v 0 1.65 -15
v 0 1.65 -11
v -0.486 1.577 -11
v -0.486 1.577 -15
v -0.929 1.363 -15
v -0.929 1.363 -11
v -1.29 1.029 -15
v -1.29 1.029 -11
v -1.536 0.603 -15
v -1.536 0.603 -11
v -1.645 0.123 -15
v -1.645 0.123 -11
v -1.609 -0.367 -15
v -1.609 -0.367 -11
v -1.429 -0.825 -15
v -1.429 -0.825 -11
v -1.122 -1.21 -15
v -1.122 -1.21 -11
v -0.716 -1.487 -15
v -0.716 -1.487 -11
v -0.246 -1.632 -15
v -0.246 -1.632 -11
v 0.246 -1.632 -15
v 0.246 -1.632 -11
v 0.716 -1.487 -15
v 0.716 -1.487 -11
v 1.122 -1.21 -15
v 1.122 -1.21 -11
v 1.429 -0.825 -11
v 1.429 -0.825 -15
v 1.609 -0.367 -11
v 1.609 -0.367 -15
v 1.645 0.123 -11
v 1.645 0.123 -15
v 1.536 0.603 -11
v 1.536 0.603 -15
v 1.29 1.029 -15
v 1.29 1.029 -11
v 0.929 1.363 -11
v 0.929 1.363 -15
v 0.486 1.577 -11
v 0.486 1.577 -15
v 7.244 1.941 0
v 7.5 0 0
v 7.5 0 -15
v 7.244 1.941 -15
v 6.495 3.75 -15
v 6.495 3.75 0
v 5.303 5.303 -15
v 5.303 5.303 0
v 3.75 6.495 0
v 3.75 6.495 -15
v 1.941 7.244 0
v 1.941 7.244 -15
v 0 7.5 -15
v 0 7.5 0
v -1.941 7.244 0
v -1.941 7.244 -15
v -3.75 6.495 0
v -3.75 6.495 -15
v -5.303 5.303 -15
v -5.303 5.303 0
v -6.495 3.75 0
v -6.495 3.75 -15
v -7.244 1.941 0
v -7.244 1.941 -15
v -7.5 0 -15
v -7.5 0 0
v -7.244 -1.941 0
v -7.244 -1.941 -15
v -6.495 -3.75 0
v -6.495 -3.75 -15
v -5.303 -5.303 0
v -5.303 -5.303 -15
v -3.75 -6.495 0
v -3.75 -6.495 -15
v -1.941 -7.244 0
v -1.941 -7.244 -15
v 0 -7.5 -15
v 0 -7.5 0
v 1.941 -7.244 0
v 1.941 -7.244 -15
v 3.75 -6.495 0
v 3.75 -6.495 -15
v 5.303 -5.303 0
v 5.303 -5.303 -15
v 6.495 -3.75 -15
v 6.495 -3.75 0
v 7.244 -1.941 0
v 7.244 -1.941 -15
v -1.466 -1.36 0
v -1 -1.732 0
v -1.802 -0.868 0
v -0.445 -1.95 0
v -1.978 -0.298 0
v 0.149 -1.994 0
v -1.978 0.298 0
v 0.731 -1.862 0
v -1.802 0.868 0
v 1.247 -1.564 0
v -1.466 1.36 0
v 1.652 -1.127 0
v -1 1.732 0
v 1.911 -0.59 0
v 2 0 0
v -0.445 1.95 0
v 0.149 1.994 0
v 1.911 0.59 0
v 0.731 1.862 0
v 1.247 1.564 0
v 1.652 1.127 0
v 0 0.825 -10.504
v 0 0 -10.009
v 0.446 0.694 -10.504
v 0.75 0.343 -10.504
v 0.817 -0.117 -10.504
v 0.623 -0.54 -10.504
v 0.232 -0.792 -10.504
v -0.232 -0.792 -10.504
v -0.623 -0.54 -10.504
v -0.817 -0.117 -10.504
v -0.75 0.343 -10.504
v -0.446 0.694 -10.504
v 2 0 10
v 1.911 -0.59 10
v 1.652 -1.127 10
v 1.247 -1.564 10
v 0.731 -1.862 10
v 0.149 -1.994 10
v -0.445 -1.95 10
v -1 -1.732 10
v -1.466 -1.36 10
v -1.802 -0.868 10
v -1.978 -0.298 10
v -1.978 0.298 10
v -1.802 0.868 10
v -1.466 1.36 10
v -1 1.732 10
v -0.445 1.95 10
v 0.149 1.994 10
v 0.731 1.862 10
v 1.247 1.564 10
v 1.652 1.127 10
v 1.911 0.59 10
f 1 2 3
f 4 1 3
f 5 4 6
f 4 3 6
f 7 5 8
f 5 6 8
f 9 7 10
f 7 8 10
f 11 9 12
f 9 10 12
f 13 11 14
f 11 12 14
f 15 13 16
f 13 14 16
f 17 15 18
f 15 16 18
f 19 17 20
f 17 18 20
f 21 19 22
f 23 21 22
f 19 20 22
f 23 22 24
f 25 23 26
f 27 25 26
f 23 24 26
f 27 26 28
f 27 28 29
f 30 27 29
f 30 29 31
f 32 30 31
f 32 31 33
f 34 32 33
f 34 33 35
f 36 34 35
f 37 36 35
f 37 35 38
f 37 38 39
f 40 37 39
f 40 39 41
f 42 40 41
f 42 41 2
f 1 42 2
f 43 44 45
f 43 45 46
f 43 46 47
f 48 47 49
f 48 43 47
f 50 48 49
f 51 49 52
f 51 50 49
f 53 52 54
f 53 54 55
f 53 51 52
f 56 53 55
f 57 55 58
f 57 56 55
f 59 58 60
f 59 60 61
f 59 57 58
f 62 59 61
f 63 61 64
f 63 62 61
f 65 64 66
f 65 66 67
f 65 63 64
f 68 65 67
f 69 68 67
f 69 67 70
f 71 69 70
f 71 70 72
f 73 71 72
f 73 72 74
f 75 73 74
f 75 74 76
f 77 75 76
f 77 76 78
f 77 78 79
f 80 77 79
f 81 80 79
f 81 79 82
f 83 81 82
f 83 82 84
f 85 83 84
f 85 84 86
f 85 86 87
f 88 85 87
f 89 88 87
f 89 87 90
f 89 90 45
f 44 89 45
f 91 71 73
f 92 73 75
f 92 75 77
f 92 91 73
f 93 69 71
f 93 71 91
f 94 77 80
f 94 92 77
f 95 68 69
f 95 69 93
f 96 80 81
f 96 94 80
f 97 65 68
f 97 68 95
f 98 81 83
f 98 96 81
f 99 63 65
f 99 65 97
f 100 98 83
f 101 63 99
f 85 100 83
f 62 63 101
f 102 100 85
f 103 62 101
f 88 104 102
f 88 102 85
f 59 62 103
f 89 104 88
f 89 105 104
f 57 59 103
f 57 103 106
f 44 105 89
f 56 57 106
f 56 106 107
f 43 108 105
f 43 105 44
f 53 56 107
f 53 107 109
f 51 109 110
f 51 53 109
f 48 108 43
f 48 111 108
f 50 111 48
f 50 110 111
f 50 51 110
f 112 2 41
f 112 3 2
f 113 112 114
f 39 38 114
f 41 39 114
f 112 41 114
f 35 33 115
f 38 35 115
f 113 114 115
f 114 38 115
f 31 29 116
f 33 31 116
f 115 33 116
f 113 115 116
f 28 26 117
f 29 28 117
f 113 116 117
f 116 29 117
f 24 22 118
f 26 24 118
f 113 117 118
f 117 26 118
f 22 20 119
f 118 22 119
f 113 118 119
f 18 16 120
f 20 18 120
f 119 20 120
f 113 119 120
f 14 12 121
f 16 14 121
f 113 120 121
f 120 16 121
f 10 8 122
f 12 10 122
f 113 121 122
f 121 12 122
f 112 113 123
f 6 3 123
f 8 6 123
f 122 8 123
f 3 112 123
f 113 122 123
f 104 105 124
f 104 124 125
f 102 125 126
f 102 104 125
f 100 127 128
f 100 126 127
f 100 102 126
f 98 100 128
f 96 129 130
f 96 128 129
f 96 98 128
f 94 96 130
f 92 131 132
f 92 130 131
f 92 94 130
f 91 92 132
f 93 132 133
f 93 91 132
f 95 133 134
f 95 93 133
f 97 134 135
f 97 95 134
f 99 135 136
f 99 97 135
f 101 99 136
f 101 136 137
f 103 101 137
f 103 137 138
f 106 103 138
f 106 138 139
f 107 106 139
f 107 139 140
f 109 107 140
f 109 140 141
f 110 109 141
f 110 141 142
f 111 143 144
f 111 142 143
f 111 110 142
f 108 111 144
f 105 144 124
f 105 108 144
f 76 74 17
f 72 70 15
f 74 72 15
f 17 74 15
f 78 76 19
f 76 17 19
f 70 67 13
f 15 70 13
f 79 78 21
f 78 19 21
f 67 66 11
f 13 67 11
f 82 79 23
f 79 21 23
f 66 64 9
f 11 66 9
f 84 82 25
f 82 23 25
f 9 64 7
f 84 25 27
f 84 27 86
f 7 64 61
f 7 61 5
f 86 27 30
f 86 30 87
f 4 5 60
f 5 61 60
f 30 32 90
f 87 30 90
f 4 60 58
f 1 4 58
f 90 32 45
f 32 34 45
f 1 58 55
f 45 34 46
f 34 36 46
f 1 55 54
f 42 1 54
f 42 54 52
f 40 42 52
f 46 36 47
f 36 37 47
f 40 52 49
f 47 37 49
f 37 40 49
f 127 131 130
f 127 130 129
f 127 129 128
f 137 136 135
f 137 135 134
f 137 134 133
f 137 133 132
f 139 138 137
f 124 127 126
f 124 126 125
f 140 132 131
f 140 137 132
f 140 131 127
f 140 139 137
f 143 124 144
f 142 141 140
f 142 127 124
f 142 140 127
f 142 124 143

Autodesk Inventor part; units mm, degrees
ref_plane "YZ Plane" through (0, 0, 0) normal (1, 0, 0) x (0, 1, 0)
ref_plane "XZ Plane" through (0, 0, 0) normal (0, 1, 0) x (-1, 0, 0)
ref_plane "XY Plane" through (0, 0, 0) normal (0, 0, 1) x (1, 0, 0)
sketch "スケッチ1" plane through (0, 0, 0) normal (0, 0, 1) x (1, 0, 0)
  circle A0 centre (0, 0) radius 7.5
  circle A1 centre (0, 0) radius 2
  dimension "d0" = 15
  dimension "d1" = 4
extrude "押し出し1" add sketch "スケッチ1" along normal blind 10 contours A1
extrude "押し出し2" add sketch "スケッチ1" against normal blind 15 contours A0 | A1
sketch "スケッチ2" plane through (0, 0, -15) normal (0, 0, -1) x (-1, 0, 0)
  circle A0 centre (0, 0) radius 7.5 projected
hole "穴1" at (0, 0, -15) direction (0, 0, 1) diameter 3.3 depth 4 tip angle 118
properties part number "防振ゴム雄ねじ雌ねじm4スペーサー長さ15"
